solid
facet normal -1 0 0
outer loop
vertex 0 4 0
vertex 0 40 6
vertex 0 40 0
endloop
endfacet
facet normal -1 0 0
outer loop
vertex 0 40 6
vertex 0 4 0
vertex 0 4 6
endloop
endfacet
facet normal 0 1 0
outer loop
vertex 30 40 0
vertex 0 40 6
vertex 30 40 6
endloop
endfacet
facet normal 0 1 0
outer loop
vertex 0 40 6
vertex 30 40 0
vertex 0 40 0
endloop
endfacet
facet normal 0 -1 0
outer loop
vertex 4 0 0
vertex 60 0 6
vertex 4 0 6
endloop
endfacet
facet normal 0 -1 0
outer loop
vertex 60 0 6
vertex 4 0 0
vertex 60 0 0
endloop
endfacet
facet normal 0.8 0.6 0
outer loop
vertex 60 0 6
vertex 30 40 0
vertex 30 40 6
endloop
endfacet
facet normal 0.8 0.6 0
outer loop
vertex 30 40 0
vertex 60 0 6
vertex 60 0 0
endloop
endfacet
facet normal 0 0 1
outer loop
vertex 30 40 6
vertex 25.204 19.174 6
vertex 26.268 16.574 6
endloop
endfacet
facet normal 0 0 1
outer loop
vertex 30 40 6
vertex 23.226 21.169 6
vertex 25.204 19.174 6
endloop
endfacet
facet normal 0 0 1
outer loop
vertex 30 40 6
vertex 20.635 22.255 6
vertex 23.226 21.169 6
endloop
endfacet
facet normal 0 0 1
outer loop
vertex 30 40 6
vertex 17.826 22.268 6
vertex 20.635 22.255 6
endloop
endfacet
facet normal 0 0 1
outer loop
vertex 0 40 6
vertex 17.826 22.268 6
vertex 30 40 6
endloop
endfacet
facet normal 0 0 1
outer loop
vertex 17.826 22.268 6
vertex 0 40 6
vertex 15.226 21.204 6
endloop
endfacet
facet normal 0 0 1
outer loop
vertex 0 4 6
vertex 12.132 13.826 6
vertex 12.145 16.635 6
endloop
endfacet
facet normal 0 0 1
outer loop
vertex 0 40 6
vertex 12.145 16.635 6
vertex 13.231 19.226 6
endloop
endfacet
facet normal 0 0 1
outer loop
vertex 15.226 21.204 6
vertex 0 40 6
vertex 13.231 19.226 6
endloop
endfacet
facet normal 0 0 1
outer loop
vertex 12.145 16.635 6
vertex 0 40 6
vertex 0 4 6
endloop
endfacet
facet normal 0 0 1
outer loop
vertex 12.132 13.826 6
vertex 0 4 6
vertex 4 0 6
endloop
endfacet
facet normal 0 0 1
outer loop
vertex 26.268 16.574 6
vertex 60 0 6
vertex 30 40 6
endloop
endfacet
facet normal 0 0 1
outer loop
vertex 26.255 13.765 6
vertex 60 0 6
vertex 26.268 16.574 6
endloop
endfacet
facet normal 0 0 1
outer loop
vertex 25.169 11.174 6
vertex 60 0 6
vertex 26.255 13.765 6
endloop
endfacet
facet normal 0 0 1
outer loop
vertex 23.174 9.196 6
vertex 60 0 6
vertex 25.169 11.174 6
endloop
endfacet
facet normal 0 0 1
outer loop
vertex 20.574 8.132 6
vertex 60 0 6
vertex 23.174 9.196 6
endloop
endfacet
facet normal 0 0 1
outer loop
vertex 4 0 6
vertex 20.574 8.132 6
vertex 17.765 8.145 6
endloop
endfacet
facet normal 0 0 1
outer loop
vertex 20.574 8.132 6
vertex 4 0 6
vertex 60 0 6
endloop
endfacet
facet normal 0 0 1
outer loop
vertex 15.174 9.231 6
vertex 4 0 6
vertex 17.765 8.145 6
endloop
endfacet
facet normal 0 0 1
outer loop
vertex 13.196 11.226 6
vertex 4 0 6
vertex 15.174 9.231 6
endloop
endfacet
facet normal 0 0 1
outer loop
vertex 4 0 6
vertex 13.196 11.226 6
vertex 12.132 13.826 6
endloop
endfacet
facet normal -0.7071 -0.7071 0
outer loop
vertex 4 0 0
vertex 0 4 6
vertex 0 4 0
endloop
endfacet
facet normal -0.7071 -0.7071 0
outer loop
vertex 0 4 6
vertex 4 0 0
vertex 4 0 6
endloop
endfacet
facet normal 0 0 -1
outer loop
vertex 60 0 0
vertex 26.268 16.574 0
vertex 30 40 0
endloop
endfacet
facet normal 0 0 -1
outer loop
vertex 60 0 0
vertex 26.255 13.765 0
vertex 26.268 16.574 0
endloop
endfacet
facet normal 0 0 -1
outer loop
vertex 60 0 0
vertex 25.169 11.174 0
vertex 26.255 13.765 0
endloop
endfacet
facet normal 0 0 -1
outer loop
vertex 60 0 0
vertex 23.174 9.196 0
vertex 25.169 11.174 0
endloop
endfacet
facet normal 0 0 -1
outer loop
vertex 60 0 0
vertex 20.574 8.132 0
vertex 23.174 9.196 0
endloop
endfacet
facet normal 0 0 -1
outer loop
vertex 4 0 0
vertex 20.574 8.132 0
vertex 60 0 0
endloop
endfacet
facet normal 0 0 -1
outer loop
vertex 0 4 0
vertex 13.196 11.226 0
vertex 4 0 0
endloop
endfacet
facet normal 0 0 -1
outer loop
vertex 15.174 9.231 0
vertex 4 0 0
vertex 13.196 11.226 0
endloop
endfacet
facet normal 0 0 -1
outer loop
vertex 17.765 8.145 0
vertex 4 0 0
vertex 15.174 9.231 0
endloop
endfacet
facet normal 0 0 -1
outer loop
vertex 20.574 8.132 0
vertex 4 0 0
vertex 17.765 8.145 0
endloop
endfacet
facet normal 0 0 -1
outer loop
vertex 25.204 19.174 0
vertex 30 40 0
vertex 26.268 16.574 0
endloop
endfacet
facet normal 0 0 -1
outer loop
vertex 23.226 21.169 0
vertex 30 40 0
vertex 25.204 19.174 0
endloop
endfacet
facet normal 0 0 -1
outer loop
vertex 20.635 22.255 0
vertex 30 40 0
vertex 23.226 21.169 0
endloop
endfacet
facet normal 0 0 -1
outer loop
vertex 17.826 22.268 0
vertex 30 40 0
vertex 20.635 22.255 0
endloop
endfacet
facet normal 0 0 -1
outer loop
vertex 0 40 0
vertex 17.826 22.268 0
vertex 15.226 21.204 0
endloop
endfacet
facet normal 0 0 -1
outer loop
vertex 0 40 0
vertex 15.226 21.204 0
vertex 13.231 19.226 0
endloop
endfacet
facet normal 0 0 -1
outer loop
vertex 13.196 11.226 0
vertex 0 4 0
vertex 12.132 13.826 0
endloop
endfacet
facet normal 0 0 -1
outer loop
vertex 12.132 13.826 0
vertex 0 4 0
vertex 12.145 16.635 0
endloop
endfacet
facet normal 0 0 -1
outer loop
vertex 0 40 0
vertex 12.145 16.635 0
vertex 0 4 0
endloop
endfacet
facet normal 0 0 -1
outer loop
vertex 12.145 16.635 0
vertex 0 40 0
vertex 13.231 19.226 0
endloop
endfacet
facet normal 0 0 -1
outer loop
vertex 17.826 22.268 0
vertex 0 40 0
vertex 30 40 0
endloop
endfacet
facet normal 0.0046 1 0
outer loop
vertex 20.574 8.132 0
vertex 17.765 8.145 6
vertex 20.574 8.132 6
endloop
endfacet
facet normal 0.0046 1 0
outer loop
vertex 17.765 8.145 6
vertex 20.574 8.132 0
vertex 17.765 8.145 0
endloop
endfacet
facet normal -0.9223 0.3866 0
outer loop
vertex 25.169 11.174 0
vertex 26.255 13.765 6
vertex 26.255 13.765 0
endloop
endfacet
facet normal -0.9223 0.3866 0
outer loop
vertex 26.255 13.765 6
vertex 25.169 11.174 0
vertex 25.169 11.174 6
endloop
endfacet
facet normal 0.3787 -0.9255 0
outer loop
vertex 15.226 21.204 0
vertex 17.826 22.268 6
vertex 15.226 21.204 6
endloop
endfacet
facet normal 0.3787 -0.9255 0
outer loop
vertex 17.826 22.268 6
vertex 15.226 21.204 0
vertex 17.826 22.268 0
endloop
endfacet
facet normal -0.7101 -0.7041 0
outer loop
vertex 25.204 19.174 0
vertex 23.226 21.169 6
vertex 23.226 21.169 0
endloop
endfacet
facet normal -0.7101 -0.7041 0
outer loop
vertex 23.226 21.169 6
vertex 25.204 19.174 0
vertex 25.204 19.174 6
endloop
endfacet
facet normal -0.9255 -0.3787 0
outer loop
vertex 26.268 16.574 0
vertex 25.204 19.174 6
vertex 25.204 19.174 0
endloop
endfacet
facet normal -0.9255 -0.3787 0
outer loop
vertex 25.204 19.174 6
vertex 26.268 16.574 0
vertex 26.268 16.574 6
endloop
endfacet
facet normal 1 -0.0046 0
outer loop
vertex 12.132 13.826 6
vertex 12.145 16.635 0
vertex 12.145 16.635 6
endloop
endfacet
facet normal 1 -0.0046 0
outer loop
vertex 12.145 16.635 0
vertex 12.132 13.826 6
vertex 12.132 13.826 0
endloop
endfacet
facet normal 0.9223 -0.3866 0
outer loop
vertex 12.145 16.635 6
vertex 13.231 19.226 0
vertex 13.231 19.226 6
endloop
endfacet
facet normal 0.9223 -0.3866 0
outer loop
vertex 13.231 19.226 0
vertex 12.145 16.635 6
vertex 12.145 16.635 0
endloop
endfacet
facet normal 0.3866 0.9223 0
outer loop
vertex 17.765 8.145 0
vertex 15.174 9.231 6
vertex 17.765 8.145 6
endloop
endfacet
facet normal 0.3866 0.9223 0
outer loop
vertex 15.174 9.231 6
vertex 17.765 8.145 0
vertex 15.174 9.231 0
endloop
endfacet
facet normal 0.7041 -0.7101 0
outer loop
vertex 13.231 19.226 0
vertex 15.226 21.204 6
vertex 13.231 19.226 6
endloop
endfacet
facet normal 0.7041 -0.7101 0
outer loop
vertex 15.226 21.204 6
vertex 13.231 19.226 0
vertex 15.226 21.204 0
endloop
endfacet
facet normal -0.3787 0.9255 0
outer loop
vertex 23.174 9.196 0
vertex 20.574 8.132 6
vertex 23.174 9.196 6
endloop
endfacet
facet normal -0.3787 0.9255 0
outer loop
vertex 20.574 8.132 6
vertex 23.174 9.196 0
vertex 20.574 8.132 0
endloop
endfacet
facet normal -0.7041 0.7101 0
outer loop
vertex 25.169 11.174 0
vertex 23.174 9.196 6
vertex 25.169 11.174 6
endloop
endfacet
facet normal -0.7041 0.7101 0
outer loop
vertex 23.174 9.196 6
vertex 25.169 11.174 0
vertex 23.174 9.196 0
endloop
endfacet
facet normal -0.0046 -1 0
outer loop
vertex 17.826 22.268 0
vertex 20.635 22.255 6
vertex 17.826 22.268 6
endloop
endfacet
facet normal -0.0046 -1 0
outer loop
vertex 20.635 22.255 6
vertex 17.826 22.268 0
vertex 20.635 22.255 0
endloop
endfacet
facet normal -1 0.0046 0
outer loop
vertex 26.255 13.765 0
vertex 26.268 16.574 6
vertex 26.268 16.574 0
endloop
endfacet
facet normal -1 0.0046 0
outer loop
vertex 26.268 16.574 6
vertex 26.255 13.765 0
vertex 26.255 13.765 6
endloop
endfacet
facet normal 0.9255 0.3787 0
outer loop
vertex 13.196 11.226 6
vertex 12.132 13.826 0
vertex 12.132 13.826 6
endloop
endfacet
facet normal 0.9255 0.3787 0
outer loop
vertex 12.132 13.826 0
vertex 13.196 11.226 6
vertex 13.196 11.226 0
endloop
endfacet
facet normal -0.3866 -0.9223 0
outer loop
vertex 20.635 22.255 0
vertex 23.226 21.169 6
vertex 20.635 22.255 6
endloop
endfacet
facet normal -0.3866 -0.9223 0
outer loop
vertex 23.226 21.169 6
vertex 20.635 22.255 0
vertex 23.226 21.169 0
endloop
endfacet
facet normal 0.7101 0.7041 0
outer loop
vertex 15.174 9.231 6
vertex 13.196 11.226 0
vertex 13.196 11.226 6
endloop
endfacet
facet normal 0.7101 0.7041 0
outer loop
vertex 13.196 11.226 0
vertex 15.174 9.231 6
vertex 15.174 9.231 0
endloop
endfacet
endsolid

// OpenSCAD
$fn = 32;

// ----------------------------------------------------------------------
// Bracket plate: gusset 60 x 40
// ----------------------------------------------------------------------

// --- parameters (mm) ---
hole_r = 3.5;             // bolt hole radius
plate_t = 6;              // plate thickness, Z (extrusion height)
gus_a = 60;               // base length
gus_b = 40;               // height
top_x = 30;               // top edge X of the angled cut
light_r = 7.2;            // lightening hole radius

light_d = 2 * light_r;

profile = [[4, 0], [30, 0], [60, 0], [30, 40], [0, 40], [0, 4]];  // primary outline, 6 points, counter clockwise
void_1 = [[26.268, 16.574], [25.204, 19.174], [23.226, 21.169], [20.635, 22.255], [17.826, 22.268], [15.226, 21.204], [13.231, 19.226], [12.145, 16.635], [12.132, 13.826], [13.196, 11.226], [15.174, 9.231], [17.765, 8.145], [20.574, 8.132], [23.174, 9.196], [25.169, 11.174], [26.255, 13.765]];  // lightening hole, 16 points

// --- the one profile operation ---
difference() {
  linear_extrude(height = plate_t) polygon(points = profile);
  translate([0, 0, -1])
    linear_extrude(height = plate_t + 2) polygon(points = void_1);
}
